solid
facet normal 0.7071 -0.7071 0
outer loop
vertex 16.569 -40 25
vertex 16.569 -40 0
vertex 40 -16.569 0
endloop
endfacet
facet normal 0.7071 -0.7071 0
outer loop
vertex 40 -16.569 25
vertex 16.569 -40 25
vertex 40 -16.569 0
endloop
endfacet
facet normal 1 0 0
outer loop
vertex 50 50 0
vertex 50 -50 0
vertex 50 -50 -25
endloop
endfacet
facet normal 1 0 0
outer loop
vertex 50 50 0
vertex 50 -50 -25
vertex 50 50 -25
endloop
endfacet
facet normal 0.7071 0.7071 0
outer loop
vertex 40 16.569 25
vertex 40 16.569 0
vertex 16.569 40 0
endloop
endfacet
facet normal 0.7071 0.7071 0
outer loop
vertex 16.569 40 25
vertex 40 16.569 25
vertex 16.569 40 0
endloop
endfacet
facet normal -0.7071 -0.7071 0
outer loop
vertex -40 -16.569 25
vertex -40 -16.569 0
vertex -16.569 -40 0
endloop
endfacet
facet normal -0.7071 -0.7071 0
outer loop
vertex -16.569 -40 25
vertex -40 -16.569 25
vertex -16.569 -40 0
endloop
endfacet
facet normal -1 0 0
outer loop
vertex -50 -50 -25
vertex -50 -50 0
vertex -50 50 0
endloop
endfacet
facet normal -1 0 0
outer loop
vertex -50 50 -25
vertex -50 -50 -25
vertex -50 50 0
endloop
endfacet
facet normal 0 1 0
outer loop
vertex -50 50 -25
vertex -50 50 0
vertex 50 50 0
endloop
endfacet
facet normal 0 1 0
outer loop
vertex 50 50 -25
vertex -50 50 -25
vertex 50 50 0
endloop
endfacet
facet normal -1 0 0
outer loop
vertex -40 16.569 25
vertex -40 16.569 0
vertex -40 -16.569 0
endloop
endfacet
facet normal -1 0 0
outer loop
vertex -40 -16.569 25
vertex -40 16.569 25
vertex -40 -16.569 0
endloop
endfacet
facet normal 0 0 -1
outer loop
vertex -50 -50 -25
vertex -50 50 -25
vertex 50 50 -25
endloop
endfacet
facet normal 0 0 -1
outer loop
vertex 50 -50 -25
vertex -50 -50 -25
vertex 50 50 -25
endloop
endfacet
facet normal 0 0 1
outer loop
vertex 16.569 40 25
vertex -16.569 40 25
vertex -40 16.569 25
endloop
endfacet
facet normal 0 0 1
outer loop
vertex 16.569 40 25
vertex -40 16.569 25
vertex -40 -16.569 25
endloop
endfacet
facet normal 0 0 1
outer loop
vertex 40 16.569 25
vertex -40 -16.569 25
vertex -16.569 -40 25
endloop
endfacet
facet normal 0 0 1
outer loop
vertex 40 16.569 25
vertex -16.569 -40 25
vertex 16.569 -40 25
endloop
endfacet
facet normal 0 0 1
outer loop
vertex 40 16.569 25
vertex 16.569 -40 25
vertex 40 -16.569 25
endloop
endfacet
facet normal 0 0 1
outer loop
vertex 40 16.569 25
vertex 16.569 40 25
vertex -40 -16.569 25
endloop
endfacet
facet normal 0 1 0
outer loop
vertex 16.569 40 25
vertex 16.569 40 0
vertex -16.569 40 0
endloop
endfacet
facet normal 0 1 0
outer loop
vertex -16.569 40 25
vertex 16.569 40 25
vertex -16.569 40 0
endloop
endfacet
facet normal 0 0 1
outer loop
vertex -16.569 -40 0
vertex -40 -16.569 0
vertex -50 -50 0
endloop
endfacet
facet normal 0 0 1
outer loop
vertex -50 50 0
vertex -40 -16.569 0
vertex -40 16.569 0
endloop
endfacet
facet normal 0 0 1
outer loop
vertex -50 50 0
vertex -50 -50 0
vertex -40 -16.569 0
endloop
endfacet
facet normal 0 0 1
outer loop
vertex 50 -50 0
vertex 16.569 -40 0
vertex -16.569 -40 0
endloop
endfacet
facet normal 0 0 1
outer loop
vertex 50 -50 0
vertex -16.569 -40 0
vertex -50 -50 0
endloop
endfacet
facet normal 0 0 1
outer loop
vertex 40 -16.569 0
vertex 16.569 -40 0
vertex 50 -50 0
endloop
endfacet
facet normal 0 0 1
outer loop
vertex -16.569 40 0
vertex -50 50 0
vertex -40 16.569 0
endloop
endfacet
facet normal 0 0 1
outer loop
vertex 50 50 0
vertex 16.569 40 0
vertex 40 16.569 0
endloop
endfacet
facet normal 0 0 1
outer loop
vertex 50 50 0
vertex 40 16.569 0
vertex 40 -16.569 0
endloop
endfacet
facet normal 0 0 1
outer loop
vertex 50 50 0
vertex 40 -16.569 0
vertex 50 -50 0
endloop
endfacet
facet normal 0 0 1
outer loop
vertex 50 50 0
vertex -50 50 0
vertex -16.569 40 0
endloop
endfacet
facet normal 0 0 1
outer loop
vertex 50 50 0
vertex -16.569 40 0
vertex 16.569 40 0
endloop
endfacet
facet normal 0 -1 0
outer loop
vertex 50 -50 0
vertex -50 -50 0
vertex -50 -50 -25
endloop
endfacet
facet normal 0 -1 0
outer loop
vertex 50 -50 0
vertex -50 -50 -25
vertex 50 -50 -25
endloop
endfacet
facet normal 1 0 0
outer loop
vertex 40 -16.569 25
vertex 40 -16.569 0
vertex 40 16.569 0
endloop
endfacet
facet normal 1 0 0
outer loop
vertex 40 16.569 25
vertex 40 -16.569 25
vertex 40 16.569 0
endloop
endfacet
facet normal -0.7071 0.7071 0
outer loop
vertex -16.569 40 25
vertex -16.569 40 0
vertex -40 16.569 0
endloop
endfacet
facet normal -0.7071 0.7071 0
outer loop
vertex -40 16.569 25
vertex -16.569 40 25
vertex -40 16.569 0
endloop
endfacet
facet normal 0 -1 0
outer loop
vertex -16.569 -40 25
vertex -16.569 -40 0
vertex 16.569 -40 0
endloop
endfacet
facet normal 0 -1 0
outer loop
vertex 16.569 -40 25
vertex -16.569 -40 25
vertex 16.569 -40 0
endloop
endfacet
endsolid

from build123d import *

# Parameters (mm, degrees)
F0_W     = 100
F0_H     = 100
F1_DEPTH = 25
F3_DEPTH = 25


with BuildPart() as f1:
    # F0 (on Top) → F1 (new body)
    with BuildSketch(Plane.XY):
        Rectangle(F0_W, F0_H)
    extrude(amount=-F1_DEPTH)

    # F2 (on face) → F3 (join)
    with BuildSketch(Plane.XY):
        Polygon((16.568542, 40), (-16.568542, 40), (-40, 16.568542), (-40, -16.568542), (-16.568542, -40), (16.568542, -40), (40, -16.568542), (40, 16.568542), align=None)
    extrude(amount=F3_DEPTH)


solid = f1.part
